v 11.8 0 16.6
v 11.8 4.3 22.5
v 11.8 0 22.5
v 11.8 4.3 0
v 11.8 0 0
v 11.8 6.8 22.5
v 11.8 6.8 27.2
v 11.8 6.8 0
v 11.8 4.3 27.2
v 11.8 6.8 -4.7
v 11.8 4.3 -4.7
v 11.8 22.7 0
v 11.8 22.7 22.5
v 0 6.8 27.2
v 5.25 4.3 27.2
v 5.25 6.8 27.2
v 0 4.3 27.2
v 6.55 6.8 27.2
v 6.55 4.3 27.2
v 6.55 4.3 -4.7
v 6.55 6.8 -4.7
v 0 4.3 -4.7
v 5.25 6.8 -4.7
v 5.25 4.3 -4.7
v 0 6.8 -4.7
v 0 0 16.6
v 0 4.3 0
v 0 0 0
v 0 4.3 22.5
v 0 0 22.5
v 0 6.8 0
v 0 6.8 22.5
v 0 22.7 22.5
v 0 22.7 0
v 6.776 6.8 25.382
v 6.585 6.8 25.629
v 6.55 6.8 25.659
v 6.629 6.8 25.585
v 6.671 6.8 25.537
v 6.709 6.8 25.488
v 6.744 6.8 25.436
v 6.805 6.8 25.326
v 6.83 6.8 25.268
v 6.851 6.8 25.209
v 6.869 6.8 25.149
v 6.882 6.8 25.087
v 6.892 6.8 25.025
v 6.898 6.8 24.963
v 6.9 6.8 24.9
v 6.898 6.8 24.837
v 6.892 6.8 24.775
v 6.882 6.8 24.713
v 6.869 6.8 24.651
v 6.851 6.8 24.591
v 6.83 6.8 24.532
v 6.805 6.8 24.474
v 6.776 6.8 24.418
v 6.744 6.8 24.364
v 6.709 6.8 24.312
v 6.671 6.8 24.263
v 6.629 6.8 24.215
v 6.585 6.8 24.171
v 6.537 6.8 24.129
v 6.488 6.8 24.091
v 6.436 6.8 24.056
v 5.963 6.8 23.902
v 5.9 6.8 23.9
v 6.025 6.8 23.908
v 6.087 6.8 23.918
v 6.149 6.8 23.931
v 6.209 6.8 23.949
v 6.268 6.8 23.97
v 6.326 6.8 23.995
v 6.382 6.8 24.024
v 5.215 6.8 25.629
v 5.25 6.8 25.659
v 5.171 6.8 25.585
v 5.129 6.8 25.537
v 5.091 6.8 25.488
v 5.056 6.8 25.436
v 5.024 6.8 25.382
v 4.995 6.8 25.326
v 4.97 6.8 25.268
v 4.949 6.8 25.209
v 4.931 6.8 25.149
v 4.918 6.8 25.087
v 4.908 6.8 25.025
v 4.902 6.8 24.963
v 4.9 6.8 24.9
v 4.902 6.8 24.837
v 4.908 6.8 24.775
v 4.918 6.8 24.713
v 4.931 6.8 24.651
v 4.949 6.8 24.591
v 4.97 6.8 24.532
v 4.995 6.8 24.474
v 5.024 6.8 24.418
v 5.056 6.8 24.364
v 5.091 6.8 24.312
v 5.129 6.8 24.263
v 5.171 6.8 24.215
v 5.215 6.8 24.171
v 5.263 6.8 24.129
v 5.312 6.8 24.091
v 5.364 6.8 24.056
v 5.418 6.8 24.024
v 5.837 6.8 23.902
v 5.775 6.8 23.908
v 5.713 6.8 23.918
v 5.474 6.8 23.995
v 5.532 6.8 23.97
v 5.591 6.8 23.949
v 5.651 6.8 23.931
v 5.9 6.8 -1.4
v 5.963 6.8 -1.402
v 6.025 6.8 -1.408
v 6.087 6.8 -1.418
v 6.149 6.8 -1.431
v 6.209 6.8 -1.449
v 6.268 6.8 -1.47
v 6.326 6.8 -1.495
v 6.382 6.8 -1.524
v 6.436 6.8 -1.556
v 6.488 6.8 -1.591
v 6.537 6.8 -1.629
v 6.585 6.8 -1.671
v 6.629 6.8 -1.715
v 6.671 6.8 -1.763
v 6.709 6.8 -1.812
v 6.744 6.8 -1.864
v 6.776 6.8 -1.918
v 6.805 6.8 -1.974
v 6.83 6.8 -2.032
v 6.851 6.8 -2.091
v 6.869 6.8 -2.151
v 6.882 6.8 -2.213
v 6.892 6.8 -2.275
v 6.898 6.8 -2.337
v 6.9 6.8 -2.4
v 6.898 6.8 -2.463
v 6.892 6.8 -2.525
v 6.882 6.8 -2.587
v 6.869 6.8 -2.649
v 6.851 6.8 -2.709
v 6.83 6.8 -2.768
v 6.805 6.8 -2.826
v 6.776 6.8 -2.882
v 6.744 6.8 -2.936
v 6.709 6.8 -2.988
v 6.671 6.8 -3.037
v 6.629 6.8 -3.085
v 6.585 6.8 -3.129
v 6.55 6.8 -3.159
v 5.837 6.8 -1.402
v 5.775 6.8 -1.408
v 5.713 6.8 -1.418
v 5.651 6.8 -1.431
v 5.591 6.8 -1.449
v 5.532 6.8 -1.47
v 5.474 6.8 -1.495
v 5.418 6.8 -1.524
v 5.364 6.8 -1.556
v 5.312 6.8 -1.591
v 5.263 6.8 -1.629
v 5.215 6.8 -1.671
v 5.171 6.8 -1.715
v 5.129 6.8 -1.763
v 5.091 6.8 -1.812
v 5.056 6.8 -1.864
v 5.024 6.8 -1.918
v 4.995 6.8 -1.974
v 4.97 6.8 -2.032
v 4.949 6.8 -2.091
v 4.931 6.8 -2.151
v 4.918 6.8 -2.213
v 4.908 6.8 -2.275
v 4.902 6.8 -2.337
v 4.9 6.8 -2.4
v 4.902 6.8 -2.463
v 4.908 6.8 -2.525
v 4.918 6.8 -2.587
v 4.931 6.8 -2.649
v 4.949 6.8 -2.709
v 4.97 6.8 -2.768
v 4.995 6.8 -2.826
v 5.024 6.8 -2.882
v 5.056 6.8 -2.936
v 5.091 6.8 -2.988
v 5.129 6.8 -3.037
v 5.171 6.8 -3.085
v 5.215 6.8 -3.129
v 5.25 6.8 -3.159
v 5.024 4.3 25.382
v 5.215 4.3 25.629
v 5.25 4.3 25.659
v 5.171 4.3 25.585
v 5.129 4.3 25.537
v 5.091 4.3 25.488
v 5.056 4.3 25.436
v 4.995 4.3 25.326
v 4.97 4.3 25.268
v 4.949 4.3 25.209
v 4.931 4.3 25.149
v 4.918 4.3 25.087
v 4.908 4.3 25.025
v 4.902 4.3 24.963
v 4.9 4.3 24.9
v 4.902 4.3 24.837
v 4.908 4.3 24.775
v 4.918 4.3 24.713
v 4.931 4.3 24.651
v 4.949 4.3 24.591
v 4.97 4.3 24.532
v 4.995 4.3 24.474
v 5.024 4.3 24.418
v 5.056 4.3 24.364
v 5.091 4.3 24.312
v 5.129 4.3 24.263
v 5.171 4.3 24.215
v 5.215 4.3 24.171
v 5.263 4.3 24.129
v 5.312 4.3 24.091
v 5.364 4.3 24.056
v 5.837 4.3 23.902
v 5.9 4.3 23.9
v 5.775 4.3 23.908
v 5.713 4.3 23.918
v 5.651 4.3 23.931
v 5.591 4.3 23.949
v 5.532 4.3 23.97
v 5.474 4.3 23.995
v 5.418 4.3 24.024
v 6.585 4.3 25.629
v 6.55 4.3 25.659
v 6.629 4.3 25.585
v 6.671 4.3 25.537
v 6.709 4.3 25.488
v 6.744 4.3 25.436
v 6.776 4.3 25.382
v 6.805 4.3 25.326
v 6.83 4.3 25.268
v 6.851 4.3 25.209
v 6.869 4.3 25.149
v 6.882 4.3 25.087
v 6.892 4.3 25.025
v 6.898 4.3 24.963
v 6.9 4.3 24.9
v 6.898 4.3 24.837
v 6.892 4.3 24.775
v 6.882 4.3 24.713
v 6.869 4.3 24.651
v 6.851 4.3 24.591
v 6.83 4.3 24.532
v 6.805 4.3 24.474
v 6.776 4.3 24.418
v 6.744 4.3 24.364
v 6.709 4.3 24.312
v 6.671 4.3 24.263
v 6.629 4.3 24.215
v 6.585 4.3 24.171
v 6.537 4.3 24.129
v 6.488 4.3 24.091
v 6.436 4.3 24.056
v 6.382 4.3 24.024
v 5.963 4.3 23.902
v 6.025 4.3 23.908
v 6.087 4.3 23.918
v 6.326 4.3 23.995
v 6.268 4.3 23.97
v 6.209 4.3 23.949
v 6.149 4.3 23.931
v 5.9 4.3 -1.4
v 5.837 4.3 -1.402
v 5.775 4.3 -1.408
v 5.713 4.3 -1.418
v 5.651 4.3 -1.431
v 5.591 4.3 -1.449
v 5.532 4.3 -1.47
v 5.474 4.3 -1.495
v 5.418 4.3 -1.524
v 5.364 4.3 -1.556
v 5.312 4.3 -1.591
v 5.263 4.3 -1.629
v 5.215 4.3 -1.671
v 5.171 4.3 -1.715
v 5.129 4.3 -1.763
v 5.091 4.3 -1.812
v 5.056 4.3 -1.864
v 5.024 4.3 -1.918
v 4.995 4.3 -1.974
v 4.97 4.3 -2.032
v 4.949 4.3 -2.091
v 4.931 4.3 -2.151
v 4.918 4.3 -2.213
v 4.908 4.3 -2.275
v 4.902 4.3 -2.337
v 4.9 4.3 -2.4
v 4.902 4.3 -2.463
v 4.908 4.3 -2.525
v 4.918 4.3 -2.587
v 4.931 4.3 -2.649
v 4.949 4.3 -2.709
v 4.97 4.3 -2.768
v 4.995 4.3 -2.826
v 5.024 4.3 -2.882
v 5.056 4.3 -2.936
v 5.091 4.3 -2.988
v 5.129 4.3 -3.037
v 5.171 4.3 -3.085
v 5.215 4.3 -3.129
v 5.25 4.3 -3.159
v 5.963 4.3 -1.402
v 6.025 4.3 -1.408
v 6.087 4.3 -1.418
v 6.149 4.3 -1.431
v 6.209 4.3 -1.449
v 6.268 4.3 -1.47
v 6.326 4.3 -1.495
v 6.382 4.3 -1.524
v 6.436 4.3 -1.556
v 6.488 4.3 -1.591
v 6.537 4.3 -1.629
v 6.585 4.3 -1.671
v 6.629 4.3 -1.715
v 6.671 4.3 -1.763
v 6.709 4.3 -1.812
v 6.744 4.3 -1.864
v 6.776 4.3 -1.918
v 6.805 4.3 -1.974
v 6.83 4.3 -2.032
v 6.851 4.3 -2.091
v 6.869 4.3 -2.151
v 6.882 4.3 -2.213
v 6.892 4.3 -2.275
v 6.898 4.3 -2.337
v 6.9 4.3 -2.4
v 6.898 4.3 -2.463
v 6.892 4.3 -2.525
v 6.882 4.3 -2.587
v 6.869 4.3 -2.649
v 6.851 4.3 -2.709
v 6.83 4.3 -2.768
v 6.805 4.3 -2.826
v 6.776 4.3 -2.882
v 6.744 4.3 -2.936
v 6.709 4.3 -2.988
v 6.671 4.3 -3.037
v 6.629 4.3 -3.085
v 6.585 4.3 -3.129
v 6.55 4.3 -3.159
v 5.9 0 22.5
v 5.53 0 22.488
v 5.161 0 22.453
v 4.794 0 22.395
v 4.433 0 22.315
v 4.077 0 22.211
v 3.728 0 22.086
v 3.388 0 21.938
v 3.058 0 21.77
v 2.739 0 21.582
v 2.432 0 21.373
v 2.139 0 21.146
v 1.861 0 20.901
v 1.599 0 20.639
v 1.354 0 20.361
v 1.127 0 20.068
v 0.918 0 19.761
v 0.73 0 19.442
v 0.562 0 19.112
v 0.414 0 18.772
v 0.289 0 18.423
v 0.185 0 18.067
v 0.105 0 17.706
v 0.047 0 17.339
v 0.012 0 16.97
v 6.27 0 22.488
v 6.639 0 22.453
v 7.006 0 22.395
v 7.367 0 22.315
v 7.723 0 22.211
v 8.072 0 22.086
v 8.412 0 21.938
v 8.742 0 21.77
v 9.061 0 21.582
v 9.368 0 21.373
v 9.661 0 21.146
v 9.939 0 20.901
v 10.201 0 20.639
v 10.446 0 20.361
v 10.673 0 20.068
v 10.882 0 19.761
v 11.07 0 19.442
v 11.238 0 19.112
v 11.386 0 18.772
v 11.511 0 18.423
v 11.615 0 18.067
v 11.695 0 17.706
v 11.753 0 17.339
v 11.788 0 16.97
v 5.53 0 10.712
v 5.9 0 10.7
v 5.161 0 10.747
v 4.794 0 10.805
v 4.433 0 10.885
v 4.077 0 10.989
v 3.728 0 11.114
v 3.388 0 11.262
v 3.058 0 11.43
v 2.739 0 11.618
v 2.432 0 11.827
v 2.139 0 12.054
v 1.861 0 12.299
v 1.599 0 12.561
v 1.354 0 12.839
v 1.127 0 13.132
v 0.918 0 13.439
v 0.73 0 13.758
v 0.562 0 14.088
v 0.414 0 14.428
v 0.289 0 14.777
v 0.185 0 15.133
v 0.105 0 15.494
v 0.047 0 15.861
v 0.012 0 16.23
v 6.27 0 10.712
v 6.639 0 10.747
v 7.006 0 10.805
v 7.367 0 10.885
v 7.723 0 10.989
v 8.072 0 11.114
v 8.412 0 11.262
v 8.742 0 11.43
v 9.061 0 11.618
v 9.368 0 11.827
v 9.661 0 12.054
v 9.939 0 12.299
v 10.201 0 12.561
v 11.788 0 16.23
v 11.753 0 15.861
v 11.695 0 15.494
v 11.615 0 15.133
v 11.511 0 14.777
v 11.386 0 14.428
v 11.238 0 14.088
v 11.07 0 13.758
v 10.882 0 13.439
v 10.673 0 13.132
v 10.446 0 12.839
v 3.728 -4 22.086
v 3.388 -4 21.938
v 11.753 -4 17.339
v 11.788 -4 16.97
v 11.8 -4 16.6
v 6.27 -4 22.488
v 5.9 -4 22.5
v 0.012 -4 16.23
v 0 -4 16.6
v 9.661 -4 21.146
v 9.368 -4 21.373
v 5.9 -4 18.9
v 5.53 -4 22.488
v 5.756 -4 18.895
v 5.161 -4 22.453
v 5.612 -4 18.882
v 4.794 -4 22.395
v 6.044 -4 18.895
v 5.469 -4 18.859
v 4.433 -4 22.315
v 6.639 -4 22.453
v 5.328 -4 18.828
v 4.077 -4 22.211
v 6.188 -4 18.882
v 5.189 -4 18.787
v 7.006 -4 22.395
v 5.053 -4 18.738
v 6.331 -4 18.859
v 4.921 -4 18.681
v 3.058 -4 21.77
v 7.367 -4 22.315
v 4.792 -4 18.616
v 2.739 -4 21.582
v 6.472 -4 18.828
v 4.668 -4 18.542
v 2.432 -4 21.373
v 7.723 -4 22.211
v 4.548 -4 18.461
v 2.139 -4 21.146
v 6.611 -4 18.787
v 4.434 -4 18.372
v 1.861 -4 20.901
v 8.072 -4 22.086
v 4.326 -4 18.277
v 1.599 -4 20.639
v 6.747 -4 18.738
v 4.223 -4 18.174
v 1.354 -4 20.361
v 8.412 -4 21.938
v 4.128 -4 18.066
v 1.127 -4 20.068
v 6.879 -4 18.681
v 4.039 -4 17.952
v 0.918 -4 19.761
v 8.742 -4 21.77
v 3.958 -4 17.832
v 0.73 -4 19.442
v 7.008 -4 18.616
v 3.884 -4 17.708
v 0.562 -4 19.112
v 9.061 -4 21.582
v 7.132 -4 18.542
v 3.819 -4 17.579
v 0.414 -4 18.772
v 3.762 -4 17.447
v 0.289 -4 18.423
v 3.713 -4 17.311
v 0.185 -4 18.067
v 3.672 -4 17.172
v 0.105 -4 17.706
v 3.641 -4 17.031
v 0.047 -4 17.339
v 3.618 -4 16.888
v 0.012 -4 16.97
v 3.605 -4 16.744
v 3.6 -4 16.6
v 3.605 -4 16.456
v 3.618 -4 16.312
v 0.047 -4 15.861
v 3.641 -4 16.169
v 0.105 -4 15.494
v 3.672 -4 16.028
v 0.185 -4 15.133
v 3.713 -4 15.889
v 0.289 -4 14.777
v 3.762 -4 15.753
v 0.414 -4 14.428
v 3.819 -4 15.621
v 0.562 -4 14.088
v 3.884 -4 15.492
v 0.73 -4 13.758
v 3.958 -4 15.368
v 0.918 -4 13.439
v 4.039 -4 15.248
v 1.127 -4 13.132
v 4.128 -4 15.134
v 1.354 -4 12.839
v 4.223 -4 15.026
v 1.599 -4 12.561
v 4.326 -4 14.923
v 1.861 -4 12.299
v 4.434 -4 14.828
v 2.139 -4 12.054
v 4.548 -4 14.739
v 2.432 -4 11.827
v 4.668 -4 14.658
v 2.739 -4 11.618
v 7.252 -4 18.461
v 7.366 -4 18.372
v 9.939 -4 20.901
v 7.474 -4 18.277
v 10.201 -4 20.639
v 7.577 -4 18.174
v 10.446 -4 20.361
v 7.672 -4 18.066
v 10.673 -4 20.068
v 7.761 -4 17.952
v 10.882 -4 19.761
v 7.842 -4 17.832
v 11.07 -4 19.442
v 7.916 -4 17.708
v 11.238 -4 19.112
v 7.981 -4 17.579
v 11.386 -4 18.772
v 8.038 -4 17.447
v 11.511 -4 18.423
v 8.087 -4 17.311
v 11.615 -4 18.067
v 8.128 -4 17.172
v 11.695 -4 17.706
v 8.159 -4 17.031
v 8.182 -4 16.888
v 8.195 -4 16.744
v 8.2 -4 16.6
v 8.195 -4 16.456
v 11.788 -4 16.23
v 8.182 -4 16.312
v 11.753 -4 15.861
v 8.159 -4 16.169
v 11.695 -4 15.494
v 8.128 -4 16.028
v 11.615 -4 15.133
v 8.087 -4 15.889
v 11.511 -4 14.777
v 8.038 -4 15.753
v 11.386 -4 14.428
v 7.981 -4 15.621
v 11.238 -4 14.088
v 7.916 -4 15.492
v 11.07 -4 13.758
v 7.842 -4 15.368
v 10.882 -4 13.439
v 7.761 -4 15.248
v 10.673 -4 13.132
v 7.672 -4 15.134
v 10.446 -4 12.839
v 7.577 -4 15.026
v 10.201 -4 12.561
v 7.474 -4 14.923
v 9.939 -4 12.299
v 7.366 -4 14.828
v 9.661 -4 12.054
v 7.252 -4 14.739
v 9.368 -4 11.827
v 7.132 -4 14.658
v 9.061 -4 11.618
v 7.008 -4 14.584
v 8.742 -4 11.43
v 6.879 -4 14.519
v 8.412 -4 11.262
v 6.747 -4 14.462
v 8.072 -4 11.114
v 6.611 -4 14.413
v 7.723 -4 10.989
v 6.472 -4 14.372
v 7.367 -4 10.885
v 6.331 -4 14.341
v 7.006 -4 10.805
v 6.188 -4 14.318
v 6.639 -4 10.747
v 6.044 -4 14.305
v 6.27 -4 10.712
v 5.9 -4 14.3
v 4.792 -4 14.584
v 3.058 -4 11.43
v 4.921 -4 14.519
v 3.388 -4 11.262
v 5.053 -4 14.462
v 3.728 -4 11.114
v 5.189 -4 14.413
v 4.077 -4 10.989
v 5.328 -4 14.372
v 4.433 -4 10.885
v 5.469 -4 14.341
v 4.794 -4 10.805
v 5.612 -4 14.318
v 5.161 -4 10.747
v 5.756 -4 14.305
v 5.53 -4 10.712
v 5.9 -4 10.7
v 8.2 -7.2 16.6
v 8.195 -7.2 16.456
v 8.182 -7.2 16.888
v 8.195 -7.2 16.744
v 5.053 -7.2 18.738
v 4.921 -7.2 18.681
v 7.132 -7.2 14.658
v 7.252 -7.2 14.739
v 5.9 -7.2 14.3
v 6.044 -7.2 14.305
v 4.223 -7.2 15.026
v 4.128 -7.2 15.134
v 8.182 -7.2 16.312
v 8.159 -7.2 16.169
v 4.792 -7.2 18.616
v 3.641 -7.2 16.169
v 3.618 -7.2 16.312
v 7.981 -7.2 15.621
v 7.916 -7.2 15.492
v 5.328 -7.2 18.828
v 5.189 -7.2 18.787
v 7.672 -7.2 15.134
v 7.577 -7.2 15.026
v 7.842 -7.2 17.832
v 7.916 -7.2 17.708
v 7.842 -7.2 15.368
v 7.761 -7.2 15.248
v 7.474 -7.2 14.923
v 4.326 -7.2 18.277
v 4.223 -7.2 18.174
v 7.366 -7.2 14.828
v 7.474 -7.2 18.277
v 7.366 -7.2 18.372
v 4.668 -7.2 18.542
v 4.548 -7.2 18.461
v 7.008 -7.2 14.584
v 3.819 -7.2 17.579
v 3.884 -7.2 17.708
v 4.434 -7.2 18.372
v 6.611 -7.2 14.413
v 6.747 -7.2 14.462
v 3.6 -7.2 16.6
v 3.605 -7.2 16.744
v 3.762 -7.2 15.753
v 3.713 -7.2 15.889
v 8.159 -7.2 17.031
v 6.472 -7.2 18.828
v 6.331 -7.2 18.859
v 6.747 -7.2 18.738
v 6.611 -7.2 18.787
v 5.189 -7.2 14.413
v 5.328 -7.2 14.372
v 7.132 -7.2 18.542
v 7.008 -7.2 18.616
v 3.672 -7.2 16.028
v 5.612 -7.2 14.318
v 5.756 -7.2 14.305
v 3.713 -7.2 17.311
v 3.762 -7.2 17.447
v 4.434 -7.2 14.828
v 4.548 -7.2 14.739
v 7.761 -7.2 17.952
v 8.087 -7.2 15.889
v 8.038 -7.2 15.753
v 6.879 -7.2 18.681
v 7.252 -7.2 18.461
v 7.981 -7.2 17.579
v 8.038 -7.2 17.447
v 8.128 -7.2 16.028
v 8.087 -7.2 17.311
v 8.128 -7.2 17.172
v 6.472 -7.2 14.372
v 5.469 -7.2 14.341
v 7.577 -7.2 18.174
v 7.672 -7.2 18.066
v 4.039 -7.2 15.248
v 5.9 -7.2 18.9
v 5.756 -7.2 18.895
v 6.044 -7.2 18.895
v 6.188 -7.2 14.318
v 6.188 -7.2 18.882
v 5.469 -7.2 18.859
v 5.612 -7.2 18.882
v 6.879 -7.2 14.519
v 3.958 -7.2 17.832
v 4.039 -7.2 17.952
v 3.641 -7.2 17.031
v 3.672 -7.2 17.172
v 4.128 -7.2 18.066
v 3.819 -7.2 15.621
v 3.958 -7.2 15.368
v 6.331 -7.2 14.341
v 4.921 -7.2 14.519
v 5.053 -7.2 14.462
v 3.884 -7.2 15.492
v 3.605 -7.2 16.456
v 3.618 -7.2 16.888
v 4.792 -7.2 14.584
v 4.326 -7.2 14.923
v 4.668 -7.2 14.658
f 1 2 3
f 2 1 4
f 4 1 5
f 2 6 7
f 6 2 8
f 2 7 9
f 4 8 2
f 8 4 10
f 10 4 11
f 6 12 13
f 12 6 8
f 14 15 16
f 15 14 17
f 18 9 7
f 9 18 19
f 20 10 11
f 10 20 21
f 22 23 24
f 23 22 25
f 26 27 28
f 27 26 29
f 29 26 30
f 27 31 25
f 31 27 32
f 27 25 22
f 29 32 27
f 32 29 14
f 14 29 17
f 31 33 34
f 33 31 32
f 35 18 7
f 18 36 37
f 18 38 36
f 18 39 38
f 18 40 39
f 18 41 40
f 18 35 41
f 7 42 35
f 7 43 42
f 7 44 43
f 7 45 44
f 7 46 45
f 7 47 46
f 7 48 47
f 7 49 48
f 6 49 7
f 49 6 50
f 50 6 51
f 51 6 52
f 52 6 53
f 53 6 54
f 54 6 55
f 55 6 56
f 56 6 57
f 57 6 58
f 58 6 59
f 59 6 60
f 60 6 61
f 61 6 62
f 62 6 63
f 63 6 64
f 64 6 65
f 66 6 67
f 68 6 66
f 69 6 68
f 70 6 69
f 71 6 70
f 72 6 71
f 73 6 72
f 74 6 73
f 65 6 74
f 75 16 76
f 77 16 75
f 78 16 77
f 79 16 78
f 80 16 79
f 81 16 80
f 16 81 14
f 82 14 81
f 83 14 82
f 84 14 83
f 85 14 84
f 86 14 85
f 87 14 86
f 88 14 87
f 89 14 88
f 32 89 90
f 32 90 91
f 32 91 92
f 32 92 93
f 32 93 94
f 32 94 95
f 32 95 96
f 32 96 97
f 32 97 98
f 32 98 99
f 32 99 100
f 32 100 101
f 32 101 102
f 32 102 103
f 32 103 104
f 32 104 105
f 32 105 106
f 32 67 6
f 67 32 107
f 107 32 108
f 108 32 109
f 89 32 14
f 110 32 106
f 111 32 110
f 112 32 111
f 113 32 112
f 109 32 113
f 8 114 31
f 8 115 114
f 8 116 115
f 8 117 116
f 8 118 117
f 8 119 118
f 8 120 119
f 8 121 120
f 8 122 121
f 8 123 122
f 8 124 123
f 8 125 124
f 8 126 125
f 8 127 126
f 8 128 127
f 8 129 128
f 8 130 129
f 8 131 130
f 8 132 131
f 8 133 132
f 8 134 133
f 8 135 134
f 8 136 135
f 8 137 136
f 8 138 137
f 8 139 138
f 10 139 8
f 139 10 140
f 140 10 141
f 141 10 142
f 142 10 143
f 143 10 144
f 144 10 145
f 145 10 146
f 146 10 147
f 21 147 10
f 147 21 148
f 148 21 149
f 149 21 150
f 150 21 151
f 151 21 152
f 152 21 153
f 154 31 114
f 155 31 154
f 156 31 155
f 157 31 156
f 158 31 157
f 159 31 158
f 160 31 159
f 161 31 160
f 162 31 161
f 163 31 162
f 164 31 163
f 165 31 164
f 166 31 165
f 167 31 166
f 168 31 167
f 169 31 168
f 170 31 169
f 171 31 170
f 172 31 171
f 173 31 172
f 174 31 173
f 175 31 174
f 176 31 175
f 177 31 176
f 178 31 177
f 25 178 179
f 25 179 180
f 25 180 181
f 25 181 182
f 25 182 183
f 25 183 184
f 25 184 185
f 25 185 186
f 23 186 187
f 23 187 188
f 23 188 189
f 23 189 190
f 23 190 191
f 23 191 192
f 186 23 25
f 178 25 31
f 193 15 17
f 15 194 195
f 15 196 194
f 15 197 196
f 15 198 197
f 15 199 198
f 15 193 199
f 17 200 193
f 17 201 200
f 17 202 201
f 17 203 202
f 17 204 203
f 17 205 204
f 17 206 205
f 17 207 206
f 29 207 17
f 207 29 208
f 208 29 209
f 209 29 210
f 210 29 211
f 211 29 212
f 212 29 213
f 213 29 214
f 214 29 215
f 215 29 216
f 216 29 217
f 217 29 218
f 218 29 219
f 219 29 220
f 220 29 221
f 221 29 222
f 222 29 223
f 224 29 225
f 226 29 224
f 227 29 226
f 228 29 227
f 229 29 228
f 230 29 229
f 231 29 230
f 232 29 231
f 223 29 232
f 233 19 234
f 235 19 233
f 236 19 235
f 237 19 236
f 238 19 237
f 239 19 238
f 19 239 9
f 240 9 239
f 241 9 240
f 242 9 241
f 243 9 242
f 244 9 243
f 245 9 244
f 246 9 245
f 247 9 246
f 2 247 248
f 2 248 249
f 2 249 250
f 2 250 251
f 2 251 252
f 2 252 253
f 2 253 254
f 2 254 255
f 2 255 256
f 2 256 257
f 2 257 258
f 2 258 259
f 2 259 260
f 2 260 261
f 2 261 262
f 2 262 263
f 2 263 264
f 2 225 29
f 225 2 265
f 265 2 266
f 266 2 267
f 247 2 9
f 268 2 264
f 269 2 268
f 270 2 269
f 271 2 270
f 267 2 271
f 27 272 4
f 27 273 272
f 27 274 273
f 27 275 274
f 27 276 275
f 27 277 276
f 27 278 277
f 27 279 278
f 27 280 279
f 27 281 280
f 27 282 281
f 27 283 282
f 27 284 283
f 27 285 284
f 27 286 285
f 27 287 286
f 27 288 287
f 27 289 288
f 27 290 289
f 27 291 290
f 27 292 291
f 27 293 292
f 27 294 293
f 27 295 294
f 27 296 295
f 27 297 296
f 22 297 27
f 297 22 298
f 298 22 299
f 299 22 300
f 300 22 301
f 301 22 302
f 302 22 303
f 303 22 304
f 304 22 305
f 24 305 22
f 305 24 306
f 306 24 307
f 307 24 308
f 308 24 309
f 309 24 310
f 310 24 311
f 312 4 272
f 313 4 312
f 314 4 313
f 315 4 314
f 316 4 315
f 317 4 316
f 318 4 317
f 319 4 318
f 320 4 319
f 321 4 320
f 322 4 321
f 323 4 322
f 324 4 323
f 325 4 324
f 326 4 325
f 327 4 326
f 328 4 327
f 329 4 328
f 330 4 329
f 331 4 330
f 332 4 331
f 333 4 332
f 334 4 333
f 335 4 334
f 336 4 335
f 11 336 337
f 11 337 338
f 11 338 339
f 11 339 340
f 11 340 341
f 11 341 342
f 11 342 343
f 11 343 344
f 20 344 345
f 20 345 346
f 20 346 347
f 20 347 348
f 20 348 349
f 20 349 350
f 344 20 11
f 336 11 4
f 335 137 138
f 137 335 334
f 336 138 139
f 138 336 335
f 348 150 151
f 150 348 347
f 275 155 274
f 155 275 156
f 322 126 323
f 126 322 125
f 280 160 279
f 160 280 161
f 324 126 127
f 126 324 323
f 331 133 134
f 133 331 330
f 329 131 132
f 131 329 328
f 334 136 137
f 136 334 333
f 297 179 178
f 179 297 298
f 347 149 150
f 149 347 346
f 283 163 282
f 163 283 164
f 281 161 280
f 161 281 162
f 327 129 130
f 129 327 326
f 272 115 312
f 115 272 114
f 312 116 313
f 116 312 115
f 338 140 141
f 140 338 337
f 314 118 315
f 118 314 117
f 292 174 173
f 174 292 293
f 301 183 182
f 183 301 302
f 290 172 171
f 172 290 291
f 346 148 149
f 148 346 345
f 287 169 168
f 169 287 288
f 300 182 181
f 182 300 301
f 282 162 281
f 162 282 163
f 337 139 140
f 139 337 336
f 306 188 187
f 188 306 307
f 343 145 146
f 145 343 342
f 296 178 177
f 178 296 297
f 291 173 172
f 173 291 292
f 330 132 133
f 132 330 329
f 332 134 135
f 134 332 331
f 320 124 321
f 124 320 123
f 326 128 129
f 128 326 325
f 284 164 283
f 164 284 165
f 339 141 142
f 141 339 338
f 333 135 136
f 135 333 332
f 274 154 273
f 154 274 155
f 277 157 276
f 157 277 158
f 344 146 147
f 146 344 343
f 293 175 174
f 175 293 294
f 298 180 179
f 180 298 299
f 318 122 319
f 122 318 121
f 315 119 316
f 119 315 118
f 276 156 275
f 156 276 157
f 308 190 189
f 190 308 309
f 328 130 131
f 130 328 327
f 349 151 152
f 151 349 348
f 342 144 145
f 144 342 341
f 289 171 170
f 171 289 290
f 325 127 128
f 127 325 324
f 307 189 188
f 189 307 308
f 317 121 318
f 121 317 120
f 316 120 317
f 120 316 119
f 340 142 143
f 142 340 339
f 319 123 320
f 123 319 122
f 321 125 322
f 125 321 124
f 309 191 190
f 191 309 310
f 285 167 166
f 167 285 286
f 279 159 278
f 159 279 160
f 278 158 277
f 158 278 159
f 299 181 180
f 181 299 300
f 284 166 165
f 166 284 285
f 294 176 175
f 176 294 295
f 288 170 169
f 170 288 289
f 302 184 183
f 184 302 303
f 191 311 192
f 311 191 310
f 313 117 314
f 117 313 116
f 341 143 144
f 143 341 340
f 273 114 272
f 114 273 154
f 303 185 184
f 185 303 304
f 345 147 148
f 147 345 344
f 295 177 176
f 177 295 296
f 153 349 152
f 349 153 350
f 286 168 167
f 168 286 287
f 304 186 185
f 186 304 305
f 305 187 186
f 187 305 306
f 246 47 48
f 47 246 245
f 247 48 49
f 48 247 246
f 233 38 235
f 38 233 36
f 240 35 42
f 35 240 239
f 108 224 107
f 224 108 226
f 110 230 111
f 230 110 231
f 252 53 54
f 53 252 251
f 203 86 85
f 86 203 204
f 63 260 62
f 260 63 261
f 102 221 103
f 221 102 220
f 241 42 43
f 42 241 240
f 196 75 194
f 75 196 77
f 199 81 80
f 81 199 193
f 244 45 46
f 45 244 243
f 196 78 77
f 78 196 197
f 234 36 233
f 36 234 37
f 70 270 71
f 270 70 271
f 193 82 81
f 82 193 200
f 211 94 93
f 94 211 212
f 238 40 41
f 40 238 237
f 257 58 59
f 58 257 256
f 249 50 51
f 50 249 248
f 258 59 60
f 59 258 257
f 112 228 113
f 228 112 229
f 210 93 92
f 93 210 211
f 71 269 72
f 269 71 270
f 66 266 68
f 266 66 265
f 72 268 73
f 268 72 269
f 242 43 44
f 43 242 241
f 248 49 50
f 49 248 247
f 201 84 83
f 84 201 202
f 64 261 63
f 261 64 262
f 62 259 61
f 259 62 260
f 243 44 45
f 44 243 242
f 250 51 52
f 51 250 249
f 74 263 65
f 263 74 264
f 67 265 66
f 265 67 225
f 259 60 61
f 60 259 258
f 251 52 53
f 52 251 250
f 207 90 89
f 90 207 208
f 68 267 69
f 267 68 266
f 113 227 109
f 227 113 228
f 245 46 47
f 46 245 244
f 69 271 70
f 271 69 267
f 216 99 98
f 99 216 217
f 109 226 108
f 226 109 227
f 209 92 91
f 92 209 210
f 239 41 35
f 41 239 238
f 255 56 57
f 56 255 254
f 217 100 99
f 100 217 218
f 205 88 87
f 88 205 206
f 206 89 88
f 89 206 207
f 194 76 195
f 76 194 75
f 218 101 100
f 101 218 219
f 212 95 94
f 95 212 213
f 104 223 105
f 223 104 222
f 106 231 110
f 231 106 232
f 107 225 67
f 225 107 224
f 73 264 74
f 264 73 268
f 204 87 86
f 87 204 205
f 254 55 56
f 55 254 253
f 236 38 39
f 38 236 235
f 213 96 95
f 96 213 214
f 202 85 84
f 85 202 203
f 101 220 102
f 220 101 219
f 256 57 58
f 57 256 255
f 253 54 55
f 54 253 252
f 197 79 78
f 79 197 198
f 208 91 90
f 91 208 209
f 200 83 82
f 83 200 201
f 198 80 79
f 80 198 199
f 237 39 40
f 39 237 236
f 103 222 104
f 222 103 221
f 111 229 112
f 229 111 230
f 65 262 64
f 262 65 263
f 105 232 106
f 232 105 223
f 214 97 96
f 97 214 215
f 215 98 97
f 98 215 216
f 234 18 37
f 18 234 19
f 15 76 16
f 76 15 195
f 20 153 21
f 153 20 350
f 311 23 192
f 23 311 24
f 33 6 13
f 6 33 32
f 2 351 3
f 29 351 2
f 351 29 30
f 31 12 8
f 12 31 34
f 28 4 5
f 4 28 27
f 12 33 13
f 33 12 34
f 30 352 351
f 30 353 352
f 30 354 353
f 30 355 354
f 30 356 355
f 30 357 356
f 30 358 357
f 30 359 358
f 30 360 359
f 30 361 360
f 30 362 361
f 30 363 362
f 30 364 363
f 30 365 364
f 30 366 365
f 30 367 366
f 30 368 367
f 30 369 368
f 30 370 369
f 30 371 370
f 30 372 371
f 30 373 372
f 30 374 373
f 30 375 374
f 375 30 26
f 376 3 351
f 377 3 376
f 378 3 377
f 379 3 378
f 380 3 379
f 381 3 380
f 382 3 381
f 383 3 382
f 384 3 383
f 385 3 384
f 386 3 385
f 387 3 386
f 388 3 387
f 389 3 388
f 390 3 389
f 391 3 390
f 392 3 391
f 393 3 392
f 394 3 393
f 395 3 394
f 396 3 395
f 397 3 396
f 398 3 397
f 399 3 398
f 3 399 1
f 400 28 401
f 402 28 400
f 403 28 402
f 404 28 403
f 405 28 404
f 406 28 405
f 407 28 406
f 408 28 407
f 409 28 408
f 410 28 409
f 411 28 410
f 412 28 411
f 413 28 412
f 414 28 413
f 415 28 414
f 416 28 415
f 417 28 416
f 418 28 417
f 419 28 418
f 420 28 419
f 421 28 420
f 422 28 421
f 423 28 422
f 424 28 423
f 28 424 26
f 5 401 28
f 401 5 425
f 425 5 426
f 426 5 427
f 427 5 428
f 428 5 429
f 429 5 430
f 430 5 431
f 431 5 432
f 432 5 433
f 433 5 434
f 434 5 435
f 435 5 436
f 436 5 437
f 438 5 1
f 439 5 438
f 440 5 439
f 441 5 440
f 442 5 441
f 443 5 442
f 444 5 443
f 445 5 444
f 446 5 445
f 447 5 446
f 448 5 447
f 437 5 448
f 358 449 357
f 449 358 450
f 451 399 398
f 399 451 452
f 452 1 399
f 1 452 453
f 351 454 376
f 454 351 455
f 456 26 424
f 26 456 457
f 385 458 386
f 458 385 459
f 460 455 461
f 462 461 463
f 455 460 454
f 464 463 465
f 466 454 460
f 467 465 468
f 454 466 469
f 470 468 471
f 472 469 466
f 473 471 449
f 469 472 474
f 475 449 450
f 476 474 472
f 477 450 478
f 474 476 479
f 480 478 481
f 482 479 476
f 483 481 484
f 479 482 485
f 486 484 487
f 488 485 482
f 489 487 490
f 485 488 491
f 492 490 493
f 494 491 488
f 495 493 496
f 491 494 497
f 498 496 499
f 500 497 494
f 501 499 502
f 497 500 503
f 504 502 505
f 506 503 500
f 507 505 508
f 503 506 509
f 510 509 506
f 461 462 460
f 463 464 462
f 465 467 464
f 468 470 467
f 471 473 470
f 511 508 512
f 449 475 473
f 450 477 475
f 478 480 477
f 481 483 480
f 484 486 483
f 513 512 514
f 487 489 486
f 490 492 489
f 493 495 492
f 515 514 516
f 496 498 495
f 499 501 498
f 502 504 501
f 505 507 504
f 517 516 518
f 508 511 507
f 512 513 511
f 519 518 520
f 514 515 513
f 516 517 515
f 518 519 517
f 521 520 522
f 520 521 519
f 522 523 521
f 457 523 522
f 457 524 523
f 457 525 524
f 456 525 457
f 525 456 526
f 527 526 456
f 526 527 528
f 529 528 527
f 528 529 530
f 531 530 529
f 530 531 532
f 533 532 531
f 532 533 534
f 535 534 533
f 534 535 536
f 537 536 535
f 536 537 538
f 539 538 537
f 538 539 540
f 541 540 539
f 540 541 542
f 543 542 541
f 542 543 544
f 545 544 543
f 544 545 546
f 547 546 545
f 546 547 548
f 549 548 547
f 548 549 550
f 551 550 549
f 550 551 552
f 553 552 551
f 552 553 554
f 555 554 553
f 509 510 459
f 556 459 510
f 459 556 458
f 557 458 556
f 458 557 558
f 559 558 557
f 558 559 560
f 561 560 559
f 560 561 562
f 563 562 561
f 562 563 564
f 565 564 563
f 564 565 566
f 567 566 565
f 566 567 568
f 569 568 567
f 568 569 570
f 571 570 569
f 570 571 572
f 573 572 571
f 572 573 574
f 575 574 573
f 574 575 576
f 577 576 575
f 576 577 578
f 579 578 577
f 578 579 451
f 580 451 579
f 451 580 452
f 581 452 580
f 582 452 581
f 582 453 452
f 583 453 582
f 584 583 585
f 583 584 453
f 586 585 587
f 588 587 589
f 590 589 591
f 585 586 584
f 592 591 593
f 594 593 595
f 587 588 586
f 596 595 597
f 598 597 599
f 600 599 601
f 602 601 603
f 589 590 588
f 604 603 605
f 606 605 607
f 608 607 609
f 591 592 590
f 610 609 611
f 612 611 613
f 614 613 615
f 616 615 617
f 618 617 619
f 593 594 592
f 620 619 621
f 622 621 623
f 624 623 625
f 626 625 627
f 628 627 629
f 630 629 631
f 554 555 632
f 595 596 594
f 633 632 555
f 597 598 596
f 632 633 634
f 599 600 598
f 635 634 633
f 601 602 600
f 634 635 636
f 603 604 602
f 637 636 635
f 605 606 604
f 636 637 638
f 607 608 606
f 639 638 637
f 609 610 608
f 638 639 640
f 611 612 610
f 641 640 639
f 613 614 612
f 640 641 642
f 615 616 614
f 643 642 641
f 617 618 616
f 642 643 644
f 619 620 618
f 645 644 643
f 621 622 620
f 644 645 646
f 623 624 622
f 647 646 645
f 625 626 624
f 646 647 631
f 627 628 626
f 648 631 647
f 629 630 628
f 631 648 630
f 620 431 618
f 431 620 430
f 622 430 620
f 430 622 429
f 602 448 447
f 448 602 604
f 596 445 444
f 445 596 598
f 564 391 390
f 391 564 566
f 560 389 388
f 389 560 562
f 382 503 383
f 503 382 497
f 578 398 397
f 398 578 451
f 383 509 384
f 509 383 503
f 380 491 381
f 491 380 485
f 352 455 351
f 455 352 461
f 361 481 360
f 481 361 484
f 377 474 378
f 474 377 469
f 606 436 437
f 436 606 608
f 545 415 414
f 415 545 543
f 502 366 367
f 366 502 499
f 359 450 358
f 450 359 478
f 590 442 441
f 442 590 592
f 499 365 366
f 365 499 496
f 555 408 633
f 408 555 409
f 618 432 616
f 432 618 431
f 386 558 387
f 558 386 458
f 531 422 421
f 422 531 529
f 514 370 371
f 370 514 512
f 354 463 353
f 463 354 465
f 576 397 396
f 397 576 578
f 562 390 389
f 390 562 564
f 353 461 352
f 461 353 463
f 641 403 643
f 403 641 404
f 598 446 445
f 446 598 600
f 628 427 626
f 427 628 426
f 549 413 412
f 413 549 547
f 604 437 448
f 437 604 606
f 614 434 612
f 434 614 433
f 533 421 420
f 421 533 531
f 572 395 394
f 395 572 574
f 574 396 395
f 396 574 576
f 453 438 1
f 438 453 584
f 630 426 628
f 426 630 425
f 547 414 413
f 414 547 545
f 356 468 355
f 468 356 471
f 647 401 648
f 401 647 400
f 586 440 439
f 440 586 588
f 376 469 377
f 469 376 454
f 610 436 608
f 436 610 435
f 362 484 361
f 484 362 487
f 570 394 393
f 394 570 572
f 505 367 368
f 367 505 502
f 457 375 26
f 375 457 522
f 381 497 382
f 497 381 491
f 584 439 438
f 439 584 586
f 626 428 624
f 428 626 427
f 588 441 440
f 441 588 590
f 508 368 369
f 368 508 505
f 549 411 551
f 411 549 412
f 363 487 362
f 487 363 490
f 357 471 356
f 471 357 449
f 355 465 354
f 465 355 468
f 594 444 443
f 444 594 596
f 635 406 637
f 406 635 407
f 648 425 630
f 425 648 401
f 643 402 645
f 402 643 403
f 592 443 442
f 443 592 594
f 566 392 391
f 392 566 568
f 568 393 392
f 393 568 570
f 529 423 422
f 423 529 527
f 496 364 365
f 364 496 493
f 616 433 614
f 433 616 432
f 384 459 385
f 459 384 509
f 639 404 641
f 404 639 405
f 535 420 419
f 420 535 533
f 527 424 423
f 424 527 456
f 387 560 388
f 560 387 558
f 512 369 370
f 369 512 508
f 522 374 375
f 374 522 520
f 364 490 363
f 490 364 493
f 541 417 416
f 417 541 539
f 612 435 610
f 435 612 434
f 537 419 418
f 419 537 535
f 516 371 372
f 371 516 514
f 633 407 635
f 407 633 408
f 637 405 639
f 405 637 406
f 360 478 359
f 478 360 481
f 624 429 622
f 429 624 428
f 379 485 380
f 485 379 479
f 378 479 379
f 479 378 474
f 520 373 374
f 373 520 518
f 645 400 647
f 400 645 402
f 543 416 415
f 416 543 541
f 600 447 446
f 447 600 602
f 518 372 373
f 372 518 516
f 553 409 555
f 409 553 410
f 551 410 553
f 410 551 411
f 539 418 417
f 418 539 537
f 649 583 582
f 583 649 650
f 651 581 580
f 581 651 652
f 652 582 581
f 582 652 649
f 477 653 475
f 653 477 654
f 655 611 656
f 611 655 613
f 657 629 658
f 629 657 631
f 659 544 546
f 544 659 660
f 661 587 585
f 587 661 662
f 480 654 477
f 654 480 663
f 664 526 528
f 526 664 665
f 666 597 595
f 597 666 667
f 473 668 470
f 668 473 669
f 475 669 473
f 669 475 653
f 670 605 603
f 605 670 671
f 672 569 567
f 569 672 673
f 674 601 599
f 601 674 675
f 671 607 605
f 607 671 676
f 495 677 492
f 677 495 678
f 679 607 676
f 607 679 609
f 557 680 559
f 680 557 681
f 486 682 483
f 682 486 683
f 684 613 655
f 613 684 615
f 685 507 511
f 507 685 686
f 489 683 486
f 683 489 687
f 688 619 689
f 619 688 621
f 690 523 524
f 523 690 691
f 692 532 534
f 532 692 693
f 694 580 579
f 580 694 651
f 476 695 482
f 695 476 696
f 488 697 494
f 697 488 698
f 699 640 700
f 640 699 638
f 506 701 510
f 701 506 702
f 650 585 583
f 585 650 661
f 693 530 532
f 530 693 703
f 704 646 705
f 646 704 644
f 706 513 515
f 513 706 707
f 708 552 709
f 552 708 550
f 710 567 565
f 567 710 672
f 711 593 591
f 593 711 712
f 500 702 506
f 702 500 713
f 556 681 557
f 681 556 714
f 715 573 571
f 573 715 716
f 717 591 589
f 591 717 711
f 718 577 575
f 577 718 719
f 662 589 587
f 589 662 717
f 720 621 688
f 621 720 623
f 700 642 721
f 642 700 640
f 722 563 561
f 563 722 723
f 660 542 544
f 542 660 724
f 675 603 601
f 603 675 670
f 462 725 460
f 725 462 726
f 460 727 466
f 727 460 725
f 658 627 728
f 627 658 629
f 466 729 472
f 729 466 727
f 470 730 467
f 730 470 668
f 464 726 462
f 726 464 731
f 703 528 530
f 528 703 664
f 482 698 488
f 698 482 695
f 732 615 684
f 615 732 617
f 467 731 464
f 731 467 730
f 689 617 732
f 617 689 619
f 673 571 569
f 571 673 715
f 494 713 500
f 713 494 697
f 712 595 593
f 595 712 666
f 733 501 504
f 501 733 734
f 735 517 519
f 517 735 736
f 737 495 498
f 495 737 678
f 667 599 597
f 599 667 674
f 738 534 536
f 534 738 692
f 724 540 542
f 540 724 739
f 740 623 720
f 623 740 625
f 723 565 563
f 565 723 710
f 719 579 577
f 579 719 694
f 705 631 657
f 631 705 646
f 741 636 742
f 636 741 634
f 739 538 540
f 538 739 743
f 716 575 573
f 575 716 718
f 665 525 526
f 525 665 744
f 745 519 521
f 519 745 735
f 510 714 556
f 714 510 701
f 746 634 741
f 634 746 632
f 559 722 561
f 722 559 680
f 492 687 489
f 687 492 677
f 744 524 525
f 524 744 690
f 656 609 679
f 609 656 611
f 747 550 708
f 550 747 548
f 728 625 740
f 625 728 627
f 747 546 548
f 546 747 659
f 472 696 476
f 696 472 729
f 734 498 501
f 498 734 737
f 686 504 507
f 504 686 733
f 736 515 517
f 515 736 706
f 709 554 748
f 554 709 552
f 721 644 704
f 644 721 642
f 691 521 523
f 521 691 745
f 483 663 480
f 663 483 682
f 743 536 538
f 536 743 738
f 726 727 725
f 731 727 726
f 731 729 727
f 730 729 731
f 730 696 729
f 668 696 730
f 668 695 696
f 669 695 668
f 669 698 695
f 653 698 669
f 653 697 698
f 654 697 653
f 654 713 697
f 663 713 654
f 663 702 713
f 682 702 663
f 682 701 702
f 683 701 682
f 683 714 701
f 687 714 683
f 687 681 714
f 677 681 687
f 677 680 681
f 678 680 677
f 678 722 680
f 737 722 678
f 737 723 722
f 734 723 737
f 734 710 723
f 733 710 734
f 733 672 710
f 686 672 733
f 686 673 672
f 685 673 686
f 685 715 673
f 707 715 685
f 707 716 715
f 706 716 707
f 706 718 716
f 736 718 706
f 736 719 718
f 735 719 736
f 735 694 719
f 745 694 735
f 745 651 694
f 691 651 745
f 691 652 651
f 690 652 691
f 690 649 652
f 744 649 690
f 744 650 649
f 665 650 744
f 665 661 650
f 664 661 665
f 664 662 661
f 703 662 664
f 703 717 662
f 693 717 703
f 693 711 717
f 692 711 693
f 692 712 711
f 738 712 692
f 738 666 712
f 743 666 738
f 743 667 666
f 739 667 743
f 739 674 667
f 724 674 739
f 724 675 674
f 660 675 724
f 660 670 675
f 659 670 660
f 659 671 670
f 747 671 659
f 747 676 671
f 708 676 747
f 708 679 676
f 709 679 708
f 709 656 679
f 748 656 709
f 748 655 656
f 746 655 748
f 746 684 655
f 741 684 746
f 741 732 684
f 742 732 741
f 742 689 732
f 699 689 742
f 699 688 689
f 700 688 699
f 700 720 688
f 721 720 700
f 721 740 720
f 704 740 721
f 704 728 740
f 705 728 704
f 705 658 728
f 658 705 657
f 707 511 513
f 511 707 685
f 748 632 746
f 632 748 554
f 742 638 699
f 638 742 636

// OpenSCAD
module SG90(){
    //colore verde-main color
    color("Blue",0.8){ 
    //corpo principale
    cube([11.8,22.7,22.5]); 
    //ali di fissaggio
    difference(){    
    translate([0,4.3,-4.7]) cube([11.8,2.5,31.9]); 
        translate([5.9,7.3,-2.4])rotate([90,0,0])
        cylinder(r=1,h=3.5,$fn=100);
        translate([5.9,7.3,24.9])rotate([90,0,0])
        cylinder(r=1,h=3.5,$fn=100);
        translate([5.25,4,25.6])cube([1.3,3.2,2.3]);
        translate([5.25,4,-4.7])cube([1.3,3.2,2.3]);
    }
    //cilindro ghiera
    translate([5.9,0,16.6]) rotate([90,0,0])
        cylinder(r=5.9,h=4,$fn=100);
    }
    //cilindro rotante  
    translate([5.9,-4,16.6]) rotate([90,0,0])
        color("White",0.8)cylinder(r=2.3,h=3.2,$fn=100);       
}

SG90();
